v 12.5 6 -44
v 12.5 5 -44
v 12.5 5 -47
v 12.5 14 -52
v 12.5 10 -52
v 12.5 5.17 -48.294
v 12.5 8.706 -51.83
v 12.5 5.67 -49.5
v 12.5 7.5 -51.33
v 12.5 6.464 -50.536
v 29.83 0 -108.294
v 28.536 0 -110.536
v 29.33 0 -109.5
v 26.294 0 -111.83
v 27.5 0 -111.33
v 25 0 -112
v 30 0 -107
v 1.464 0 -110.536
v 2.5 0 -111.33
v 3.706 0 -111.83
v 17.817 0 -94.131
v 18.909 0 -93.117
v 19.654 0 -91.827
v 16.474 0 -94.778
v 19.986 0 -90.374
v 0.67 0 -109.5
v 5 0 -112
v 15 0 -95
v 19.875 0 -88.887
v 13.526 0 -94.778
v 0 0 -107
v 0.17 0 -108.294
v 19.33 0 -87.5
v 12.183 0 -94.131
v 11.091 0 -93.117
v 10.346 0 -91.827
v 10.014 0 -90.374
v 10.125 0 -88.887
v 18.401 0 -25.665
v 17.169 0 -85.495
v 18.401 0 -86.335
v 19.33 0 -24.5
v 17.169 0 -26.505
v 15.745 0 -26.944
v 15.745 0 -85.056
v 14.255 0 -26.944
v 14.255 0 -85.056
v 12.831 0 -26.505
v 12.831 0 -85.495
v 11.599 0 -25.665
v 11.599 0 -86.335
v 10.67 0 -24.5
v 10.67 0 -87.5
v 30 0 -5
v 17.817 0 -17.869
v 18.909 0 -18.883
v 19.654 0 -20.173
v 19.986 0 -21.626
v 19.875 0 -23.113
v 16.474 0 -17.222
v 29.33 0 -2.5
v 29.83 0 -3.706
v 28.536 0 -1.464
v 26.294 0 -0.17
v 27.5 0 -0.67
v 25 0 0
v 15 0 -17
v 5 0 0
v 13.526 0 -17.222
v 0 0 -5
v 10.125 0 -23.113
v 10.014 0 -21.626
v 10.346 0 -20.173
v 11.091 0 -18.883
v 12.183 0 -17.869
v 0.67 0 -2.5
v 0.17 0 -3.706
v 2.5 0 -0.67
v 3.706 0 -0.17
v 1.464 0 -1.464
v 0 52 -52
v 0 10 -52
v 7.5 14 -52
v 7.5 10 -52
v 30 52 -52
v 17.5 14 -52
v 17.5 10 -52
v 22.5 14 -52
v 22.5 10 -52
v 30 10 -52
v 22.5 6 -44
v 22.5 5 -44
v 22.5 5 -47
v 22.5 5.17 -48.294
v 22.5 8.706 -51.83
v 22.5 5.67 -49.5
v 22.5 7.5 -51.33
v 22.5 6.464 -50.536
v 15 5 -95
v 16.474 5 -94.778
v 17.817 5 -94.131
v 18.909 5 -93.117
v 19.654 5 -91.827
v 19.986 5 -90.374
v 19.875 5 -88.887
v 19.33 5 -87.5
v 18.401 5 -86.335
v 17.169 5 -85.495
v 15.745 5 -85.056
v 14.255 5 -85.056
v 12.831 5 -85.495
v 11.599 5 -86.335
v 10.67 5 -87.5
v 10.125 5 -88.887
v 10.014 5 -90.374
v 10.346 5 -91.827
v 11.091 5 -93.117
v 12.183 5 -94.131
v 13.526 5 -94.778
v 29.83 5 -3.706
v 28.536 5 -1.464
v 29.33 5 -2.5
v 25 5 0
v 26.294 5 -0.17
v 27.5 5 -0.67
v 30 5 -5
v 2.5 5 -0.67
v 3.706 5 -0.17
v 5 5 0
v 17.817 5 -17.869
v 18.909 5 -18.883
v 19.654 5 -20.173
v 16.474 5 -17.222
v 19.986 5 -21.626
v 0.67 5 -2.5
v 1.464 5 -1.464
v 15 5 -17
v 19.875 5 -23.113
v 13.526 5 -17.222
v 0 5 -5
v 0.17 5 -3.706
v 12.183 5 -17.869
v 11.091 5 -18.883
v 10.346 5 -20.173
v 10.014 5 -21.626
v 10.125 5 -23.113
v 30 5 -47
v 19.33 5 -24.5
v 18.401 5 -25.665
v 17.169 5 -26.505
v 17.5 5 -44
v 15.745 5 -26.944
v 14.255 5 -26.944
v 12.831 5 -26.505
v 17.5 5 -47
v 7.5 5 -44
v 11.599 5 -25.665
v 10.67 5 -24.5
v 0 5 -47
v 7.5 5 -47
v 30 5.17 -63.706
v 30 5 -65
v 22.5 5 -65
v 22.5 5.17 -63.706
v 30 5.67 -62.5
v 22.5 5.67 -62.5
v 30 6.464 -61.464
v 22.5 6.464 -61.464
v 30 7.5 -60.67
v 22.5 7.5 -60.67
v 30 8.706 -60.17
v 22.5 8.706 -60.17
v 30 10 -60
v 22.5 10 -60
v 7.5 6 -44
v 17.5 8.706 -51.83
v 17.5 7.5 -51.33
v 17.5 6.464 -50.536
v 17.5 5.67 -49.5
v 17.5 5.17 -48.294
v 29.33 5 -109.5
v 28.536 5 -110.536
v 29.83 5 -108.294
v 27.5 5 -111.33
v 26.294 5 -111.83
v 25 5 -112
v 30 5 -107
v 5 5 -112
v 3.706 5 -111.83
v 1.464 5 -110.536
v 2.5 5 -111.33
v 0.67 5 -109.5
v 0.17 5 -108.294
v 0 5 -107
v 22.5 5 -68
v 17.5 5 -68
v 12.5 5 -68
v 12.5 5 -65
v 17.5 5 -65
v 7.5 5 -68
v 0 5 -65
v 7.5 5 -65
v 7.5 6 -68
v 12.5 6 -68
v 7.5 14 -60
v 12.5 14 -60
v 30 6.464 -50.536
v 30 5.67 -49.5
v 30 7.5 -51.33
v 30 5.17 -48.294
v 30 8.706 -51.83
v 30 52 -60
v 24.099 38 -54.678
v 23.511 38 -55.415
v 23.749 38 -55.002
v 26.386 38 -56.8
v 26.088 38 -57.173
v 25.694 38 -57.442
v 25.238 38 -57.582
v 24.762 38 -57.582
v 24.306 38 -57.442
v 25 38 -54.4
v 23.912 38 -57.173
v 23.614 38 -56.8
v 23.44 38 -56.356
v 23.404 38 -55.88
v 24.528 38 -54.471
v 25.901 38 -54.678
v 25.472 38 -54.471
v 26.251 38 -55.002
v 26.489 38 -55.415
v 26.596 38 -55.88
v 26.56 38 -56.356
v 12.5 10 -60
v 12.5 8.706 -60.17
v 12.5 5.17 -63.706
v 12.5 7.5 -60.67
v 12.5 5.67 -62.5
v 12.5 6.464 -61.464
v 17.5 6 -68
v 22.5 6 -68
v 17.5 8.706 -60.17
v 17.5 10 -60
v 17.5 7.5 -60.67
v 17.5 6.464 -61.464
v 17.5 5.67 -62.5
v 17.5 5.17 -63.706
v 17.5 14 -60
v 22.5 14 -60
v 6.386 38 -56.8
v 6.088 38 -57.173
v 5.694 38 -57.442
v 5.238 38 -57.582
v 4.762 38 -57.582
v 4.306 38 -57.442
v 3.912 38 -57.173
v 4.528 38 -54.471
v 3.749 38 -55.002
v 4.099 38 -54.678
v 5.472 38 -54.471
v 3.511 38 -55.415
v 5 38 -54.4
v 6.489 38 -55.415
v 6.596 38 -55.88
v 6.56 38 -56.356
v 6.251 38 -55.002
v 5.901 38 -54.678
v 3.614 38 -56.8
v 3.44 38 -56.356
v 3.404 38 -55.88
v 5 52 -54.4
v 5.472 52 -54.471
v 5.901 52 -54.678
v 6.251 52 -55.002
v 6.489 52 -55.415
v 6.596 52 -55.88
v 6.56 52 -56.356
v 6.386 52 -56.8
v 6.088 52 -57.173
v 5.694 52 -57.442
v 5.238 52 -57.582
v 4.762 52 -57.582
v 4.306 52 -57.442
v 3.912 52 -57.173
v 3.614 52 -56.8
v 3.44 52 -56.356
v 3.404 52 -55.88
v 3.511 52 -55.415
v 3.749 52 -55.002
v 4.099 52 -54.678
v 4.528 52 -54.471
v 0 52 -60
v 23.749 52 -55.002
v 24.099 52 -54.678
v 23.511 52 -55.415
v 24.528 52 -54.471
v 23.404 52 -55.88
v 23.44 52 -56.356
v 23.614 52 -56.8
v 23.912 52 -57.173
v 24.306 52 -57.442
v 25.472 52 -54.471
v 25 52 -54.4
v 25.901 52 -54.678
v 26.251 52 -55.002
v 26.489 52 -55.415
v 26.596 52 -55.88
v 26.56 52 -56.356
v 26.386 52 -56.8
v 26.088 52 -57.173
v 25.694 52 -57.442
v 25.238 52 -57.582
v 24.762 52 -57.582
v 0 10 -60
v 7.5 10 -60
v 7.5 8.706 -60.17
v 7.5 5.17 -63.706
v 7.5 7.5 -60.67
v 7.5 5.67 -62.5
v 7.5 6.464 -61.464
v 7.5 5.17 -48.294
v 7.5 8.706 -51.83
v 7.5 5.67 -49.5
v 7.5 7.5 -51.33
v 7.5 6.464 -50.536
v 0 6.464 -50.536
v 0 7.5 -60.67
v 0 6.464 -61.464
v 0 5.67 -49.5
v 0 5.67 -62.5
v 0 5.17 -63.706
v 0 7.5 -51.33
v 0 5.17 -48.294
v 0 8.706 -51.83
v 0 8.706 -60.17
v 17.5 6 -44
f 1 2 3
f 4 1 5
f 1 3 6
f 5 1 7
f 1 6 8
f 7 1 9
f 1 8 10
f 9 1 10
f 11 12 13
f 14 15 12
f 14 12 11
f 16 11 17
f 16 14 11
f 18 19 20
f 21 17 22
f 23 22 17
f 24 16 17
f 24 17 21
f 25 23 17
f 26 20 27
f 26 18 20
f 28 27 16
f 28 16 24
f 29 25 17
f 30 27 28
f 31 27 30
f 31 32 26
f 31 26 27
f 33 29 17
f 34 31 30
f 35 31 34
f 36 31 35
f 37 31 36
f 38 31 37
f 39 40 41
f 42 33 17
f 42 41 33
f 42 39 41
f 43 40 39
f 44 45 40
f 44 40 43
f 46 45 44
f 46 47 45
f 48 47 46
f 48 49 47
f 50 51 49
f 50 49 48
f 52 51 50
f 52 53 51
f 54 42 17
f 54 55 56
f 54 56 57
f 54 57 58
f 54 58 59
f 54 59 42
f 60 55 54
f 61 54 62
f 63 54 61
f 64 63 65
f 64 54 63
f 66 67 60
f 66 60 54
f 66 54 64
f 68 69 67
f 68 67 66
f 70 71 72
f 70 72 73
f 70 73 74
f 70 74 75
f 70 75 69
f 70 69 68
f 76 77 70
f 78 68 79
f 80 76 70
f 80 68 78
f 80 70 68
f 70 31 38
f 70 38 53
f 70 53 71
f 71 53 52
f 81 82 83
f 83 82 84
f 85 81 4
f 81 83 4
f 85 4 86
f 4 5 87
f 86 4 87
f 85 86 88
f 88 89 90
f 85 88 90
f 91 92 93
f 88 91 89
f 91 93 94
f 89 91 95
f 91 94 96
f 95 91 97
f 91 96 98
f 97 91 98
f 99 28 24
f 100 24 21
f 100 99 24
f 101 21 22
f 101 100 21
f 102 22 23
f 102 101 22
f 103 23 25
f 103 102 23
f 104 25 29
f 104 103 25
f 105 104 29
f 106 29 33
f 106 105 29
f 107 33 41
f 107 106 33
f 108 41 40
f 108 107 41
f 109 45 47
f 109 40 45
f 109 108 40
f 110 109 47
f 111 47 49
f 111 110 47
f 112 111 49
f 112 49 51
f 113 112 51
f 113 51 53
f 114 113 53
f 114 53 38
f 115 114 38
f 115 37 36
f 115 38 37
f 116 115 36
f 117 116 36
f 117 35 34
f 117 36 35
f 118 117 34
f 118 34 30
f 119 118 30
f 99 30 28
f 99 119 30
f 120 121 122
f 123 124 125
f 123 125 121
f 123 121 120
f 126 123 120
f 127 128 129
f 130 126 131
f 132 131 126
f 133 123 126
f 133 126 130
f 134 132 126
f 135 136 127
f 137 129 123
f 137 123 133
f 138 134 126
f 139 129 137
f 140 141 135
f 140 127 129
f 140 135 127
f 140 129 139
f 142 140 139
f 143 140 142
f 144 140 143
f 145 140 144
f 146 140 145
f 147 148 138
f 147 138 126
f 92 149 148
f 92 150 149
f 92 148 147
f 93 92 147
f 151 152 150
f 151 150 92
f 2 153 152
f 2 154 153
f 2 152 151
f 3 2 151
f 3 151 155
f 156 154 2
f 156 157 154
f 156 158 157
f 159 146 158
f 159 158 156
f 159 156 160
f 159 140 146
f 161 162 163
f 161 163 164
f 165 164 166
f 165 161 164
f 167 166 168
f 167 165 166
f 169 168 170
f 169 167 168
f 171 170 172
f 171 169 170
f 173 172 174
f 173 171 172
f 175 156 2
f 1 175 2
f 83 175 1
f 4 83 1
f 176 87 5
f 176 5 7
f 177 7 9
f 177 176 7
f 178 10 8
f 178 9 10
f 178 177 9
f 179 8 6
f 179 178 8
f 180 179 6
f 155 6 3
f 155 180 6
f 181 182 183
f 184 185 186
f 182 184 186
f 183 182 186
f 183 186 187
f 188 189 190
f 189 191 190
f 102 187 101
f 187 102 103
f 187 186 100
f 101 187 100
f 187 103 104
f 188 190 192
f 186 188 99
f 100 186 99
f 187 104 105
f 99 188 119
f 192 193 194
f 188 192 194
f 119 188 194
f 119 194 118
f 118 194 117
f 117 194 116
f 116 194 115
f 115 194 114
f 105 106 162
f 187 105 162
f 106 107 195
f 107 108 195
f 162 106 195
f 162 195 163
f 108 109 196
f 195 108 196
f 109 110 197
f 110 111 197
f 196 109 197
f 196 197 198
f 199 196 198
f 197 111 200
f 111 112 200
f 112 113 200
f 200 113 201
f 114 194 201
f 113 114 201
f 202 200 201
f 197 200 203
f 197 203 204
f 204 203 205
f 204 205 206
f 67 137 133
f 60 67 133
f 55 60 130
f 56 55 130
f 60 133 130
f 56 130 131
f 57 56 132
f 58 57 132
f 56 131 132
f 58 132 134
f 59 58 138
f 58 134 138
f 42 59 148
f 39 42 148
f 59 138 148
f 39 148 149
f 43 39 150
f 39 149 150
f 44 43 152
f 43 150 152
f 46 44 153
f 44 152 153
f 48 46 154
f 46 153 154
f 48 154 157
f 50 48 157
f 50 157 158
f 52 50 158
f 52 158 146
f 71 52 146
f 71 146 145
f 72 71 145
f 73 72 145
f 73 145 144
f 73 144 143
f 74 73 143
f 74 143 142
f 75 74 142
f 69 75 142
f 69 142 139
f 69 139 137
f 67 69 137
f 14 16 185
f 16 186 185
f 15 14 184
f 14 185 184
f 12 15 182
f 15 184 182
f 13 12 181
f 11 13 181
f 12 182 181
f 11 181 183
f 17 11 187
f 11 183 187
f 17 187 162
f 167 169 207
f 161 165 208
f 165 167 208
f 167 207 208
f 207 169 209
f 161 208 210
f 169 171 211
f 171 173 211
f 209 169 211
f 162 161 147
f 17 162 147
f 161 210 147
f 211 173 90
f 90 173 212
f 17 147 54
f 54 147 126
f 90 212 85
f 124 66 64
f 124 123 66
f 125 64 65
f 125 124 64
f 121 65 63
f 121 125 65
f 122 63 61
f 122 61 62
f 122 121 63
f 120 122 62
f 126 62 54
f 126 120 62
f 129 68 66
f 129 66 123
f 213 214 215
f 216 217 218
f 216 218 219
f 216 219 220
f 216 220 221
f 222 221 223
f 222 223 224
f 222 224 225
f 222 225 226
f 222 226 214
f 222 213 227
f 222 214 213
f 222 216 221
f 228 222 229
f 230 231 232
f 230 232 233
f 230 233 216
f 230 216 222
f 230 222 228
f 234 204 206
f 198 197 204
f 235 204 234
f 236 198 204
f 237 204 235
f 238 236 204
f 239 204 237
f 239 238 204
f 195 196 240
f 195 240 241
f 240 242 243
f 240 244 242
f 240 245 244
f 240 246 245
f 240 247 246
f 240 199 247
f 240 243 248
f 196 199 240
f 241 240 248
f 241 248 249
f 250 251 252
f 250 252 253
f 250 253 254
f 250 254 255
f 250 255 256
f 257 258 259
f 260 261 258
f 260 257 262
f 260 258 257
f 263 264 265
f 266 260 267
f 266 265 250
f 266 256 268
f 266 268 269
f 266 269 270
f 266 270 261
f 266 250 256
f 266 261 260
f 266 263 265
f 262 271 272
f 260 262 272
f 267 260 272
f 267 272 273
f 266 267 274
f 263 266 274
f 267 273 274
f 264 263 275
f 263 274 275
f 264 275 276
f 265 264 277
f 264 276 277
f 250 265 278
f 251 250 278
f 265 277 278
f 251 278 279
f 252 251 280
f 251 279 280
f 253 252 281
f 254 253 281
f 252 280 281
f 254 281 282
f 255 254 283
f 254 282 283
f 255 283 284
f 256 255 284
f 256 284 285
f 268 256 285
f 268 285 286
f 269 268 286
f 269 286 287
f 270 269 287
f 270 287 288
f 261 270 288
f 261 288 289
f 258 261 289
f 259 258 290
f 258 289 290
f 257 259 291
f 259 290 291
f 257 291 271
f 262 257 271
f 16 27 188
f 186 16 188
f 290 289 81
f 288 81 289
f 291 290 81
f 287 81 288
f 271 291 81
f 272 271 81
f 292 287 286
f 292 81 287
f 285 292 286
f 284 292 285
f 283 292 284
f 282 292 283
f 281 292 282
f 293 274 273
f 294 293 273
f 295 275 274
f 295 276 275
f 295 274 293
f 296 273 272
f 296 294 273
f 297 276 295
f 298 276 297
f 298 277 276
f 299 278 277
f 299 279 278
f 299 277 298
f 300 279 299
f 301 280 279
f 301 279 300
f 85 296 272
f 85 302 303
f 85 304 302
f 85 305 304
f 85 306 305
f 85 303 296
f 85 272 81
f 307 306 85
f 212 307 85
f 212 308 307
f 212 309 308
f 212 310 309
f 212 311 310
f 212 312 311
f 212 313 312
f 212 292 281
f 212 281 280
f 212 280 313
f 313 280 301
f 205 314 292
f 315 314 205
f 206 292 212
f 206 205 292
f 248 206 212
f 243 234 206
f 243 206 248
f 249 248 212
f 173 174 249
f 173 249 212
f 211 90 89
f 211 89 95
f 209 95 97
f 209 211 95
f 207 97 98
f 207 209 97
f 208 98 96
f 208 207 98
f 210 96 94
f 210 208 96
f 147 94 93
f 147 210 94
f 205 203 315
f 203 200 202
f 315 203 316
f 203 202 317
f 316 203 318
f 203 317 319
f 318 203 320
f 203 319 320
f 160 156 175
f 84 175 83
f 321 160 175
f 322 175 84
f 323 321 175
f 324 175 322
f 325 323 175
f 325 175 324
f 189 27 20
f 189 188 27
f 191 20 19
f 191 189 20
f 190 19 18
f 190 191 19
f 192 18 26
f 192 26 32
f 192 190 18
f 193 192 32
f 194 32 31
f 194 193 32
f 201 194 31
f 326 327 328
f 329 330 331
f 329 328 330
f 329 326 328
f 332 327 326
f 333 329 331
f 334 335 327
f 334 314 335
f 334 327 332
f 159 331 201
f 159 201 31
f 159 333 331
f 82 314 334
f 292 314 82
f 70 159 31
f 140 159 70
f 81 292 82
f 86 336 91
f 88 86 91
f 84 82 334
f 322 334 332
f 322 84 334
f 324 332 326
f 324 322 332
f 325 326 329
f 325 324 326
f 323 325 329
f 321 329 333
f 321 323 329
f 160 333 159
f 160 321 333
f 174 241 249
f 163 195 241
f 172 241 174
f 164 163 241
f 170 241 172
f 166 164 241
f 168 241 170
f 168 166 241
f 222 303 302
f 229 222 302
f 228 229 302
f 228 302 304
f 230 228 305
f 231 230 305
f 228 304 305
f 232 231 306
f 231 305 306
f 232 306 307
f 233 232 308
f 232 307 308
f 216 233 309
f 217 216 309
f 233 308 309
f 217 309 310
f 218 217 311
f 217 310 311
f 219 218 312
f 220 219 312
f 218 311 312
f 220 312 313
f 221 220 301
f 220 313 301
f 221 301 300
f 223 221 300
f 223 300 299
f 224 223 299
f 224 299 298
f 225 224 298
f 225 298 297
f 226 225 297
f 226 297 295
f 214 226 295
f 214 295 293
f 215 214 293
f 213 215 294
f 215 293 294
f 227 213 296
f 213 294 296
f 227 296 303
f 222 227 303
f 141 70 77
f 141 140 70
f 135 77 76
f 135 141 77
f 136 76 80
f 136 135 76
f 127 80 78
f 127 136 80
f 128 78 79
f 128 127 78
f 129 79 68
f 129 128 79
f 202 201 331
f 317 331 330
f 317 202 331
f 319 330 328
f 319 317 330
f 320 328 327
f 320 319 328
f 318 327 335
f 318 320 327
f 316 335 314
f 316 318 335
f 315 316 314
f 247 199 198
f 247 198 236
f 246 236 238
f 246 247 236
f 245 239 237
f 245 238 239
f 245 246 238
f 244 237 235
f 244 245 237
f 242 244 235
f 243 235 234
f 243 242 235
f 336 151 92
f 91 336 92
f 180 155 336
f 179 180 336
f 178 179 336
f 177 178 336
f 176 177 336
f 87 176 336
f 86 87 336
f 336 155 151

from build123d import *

# Parameters (mm, degrees)
SKETCH1_W                = 60
SKETCH1_H                = 5
BOSS_EXTRUDE1_DEPTH      = 30
SKETCH2_W                = 30
SKETCH2_H                = 8
BOSS_EXTRUDE2_DEPTH      = 47
SKETCH3_R                = 5
CUT_EXTRUDE1_DEPTH       = 82.908485519
SKETCH5_R                = 1.6
CUT_EXTRUDE3_DEPTH       = 14
FILLET1_R                = 5
FILLET2_R                = 5
SKETCH6_W                = 5
SKETCH6_H                = 5
SKETCH6_H_2              = 3
SKETCH6_H_3              = 8
BOSS_EXTRUDE3_DEPTH      = 9
CHAMFER1_SIZE            = 8
CHAMFER1_OF_MIRROR2_SIZE = 8


with BuildPart() as part:
    # Sketch1 → Boss-Extrude1 (new body)
    with BuildSketch(Plane(origin=(0, 0, 0), x_dir=(0, 0, -1), z_dir=(1, 0, 0))):
        with Locations((30, 2.5)):
            Rectangle(SKETCH1_W, SKETCH1_H)
    boss_extrude1 = extrude(amount=BOSS_EXTRUDE1_DEPTH)

    # Sketch2 → Boss-Extrude2 (add)
    with BuildSketch(Plane(origin=(0, 5, 0), x_dir=(1, 0, 0), z_dir=(0, 1, 0))):
        with Locations((15, 56)):
            Rectangle(SKETCH2_W, SKETCH2_H)
    extrude(amount=BOSS_EXTRUDE2_DEPTH)

    # Sketch3 → Cut-Extrude1 (cut, through all)
    with BuildSketch(Plane(origin=(0, 5, 0), x_dir=(1, 0, 0), z_dir=(0, 1, 0))):
        with Locations(Location((15, 22, 0), (0, 0, 270))):
            Circle(SKETCH3_R)
    cut_extrude1 = extrude(amount=-CUT_EXTRUDE1_DEPTH, mode=Mode.SUBTRACT)

    # Sketch5 → Cut-Extrude3 (cut)
    with BuildSketch(Plane(origin=(0, 52, 0), x_dir=(1, 0, 0), z_dir=(0, 1, 0))):
        with Locations(Location((5, 56, 0), (0, 0, 270))):
            Circle(SKETCH5_R)
        with Locations(Location((25, 56, 0), (0, 0, 270))):
            Circle(SKETCH5_R)
    extrude(amount=-CUT_EXTRUDE3_DEPTH, mode=Mode.SUBTRACT)

    # Fillet1
    fillet1_edges = [part.edges().sort_by_distance(p)[0] for p in [
        (15, 5, -52),
        (30, 2.5, 0),
        (0, 2.5, 0),
        (15, 0, -60),
    ]]
    fillet(fillet1_edges, radius=FILLET1_R)

    # Mirror1: Boss-Extrude1, Cut-Extrude1 across plane
    add(boss_extrude1.mirror(Plane(origin=(0, 0, -56), x_dir=(1, 0, 0), z_dir=(0, 0, -1))))
    add(cut_extrude1.mirror(Plane(origin=(0, 0, -56), x_dir=(1, 0, 0), z_dir=(0, 0, -1))), mode=Mode.SUBTRACT)

    # Fillet2
    fillet2_edges = [part.edges().sort_by_distance(p)[0] for p in [
        (15, 5, -60),
        (0, 2.5, -112),
        (30, 2.5, -112),
    ]]
    fillet(fillet2_edges, radius=FILLET2_R)

    # Sketch6 → Boss-Extrude3 (add)
    with BuildSketch(Plane(origin=(0, 5, 0), x_dir=(1, 0, 0), z_dir=(0, 1, 0))):
        with Locations((20, 49.5)):
            Rectangle(SKETCH6_W, SKETCH6_H)
        with Locations((20, 45.5)):
            Rectangle(SKETCH6_W, SKETCH6_H_2)
        with Locations((10, 48)):
            Rectangle(SKETCH6_W, SKETCH6_H_3)
    boss_extrude3 = extrude(amount=BOSS_EXTRUDE3_DEPTH)

    # Chamfer1
    chamfer1_edges = [part.edges().sort_by_distance(p)[0] for p in [
        (20, 14, -44),
        (10, 14, -44),
    ]]
    chamfer(chamfer1_edges, length=CHAMFER1_SIZE - 0.0001)  # a hair under: the kernel refuses the full size

    # Mirror2: Boss-Extrude3 across plane
    add(boss_extrude3.mirror(Plane(origin=(0, 0, -56), x_dir=(1, 0, 0), z_dir=(0, 0, -1))))

    # Chamfer1 of Mirror2
    chamfer1_of_mirror2_edges = [part.edges().sort_by_distance(p)[0] for p in [
        (20, 14, -68),
        (10, 14, -68),
    ]]
    chamfer(chamfer1_of_mirror2_edges, length=CHAMFER1_OF_MIRROR2_SIZE - 0.0001)  # a hair under: the kernel refuses the full size


solid = part.part
